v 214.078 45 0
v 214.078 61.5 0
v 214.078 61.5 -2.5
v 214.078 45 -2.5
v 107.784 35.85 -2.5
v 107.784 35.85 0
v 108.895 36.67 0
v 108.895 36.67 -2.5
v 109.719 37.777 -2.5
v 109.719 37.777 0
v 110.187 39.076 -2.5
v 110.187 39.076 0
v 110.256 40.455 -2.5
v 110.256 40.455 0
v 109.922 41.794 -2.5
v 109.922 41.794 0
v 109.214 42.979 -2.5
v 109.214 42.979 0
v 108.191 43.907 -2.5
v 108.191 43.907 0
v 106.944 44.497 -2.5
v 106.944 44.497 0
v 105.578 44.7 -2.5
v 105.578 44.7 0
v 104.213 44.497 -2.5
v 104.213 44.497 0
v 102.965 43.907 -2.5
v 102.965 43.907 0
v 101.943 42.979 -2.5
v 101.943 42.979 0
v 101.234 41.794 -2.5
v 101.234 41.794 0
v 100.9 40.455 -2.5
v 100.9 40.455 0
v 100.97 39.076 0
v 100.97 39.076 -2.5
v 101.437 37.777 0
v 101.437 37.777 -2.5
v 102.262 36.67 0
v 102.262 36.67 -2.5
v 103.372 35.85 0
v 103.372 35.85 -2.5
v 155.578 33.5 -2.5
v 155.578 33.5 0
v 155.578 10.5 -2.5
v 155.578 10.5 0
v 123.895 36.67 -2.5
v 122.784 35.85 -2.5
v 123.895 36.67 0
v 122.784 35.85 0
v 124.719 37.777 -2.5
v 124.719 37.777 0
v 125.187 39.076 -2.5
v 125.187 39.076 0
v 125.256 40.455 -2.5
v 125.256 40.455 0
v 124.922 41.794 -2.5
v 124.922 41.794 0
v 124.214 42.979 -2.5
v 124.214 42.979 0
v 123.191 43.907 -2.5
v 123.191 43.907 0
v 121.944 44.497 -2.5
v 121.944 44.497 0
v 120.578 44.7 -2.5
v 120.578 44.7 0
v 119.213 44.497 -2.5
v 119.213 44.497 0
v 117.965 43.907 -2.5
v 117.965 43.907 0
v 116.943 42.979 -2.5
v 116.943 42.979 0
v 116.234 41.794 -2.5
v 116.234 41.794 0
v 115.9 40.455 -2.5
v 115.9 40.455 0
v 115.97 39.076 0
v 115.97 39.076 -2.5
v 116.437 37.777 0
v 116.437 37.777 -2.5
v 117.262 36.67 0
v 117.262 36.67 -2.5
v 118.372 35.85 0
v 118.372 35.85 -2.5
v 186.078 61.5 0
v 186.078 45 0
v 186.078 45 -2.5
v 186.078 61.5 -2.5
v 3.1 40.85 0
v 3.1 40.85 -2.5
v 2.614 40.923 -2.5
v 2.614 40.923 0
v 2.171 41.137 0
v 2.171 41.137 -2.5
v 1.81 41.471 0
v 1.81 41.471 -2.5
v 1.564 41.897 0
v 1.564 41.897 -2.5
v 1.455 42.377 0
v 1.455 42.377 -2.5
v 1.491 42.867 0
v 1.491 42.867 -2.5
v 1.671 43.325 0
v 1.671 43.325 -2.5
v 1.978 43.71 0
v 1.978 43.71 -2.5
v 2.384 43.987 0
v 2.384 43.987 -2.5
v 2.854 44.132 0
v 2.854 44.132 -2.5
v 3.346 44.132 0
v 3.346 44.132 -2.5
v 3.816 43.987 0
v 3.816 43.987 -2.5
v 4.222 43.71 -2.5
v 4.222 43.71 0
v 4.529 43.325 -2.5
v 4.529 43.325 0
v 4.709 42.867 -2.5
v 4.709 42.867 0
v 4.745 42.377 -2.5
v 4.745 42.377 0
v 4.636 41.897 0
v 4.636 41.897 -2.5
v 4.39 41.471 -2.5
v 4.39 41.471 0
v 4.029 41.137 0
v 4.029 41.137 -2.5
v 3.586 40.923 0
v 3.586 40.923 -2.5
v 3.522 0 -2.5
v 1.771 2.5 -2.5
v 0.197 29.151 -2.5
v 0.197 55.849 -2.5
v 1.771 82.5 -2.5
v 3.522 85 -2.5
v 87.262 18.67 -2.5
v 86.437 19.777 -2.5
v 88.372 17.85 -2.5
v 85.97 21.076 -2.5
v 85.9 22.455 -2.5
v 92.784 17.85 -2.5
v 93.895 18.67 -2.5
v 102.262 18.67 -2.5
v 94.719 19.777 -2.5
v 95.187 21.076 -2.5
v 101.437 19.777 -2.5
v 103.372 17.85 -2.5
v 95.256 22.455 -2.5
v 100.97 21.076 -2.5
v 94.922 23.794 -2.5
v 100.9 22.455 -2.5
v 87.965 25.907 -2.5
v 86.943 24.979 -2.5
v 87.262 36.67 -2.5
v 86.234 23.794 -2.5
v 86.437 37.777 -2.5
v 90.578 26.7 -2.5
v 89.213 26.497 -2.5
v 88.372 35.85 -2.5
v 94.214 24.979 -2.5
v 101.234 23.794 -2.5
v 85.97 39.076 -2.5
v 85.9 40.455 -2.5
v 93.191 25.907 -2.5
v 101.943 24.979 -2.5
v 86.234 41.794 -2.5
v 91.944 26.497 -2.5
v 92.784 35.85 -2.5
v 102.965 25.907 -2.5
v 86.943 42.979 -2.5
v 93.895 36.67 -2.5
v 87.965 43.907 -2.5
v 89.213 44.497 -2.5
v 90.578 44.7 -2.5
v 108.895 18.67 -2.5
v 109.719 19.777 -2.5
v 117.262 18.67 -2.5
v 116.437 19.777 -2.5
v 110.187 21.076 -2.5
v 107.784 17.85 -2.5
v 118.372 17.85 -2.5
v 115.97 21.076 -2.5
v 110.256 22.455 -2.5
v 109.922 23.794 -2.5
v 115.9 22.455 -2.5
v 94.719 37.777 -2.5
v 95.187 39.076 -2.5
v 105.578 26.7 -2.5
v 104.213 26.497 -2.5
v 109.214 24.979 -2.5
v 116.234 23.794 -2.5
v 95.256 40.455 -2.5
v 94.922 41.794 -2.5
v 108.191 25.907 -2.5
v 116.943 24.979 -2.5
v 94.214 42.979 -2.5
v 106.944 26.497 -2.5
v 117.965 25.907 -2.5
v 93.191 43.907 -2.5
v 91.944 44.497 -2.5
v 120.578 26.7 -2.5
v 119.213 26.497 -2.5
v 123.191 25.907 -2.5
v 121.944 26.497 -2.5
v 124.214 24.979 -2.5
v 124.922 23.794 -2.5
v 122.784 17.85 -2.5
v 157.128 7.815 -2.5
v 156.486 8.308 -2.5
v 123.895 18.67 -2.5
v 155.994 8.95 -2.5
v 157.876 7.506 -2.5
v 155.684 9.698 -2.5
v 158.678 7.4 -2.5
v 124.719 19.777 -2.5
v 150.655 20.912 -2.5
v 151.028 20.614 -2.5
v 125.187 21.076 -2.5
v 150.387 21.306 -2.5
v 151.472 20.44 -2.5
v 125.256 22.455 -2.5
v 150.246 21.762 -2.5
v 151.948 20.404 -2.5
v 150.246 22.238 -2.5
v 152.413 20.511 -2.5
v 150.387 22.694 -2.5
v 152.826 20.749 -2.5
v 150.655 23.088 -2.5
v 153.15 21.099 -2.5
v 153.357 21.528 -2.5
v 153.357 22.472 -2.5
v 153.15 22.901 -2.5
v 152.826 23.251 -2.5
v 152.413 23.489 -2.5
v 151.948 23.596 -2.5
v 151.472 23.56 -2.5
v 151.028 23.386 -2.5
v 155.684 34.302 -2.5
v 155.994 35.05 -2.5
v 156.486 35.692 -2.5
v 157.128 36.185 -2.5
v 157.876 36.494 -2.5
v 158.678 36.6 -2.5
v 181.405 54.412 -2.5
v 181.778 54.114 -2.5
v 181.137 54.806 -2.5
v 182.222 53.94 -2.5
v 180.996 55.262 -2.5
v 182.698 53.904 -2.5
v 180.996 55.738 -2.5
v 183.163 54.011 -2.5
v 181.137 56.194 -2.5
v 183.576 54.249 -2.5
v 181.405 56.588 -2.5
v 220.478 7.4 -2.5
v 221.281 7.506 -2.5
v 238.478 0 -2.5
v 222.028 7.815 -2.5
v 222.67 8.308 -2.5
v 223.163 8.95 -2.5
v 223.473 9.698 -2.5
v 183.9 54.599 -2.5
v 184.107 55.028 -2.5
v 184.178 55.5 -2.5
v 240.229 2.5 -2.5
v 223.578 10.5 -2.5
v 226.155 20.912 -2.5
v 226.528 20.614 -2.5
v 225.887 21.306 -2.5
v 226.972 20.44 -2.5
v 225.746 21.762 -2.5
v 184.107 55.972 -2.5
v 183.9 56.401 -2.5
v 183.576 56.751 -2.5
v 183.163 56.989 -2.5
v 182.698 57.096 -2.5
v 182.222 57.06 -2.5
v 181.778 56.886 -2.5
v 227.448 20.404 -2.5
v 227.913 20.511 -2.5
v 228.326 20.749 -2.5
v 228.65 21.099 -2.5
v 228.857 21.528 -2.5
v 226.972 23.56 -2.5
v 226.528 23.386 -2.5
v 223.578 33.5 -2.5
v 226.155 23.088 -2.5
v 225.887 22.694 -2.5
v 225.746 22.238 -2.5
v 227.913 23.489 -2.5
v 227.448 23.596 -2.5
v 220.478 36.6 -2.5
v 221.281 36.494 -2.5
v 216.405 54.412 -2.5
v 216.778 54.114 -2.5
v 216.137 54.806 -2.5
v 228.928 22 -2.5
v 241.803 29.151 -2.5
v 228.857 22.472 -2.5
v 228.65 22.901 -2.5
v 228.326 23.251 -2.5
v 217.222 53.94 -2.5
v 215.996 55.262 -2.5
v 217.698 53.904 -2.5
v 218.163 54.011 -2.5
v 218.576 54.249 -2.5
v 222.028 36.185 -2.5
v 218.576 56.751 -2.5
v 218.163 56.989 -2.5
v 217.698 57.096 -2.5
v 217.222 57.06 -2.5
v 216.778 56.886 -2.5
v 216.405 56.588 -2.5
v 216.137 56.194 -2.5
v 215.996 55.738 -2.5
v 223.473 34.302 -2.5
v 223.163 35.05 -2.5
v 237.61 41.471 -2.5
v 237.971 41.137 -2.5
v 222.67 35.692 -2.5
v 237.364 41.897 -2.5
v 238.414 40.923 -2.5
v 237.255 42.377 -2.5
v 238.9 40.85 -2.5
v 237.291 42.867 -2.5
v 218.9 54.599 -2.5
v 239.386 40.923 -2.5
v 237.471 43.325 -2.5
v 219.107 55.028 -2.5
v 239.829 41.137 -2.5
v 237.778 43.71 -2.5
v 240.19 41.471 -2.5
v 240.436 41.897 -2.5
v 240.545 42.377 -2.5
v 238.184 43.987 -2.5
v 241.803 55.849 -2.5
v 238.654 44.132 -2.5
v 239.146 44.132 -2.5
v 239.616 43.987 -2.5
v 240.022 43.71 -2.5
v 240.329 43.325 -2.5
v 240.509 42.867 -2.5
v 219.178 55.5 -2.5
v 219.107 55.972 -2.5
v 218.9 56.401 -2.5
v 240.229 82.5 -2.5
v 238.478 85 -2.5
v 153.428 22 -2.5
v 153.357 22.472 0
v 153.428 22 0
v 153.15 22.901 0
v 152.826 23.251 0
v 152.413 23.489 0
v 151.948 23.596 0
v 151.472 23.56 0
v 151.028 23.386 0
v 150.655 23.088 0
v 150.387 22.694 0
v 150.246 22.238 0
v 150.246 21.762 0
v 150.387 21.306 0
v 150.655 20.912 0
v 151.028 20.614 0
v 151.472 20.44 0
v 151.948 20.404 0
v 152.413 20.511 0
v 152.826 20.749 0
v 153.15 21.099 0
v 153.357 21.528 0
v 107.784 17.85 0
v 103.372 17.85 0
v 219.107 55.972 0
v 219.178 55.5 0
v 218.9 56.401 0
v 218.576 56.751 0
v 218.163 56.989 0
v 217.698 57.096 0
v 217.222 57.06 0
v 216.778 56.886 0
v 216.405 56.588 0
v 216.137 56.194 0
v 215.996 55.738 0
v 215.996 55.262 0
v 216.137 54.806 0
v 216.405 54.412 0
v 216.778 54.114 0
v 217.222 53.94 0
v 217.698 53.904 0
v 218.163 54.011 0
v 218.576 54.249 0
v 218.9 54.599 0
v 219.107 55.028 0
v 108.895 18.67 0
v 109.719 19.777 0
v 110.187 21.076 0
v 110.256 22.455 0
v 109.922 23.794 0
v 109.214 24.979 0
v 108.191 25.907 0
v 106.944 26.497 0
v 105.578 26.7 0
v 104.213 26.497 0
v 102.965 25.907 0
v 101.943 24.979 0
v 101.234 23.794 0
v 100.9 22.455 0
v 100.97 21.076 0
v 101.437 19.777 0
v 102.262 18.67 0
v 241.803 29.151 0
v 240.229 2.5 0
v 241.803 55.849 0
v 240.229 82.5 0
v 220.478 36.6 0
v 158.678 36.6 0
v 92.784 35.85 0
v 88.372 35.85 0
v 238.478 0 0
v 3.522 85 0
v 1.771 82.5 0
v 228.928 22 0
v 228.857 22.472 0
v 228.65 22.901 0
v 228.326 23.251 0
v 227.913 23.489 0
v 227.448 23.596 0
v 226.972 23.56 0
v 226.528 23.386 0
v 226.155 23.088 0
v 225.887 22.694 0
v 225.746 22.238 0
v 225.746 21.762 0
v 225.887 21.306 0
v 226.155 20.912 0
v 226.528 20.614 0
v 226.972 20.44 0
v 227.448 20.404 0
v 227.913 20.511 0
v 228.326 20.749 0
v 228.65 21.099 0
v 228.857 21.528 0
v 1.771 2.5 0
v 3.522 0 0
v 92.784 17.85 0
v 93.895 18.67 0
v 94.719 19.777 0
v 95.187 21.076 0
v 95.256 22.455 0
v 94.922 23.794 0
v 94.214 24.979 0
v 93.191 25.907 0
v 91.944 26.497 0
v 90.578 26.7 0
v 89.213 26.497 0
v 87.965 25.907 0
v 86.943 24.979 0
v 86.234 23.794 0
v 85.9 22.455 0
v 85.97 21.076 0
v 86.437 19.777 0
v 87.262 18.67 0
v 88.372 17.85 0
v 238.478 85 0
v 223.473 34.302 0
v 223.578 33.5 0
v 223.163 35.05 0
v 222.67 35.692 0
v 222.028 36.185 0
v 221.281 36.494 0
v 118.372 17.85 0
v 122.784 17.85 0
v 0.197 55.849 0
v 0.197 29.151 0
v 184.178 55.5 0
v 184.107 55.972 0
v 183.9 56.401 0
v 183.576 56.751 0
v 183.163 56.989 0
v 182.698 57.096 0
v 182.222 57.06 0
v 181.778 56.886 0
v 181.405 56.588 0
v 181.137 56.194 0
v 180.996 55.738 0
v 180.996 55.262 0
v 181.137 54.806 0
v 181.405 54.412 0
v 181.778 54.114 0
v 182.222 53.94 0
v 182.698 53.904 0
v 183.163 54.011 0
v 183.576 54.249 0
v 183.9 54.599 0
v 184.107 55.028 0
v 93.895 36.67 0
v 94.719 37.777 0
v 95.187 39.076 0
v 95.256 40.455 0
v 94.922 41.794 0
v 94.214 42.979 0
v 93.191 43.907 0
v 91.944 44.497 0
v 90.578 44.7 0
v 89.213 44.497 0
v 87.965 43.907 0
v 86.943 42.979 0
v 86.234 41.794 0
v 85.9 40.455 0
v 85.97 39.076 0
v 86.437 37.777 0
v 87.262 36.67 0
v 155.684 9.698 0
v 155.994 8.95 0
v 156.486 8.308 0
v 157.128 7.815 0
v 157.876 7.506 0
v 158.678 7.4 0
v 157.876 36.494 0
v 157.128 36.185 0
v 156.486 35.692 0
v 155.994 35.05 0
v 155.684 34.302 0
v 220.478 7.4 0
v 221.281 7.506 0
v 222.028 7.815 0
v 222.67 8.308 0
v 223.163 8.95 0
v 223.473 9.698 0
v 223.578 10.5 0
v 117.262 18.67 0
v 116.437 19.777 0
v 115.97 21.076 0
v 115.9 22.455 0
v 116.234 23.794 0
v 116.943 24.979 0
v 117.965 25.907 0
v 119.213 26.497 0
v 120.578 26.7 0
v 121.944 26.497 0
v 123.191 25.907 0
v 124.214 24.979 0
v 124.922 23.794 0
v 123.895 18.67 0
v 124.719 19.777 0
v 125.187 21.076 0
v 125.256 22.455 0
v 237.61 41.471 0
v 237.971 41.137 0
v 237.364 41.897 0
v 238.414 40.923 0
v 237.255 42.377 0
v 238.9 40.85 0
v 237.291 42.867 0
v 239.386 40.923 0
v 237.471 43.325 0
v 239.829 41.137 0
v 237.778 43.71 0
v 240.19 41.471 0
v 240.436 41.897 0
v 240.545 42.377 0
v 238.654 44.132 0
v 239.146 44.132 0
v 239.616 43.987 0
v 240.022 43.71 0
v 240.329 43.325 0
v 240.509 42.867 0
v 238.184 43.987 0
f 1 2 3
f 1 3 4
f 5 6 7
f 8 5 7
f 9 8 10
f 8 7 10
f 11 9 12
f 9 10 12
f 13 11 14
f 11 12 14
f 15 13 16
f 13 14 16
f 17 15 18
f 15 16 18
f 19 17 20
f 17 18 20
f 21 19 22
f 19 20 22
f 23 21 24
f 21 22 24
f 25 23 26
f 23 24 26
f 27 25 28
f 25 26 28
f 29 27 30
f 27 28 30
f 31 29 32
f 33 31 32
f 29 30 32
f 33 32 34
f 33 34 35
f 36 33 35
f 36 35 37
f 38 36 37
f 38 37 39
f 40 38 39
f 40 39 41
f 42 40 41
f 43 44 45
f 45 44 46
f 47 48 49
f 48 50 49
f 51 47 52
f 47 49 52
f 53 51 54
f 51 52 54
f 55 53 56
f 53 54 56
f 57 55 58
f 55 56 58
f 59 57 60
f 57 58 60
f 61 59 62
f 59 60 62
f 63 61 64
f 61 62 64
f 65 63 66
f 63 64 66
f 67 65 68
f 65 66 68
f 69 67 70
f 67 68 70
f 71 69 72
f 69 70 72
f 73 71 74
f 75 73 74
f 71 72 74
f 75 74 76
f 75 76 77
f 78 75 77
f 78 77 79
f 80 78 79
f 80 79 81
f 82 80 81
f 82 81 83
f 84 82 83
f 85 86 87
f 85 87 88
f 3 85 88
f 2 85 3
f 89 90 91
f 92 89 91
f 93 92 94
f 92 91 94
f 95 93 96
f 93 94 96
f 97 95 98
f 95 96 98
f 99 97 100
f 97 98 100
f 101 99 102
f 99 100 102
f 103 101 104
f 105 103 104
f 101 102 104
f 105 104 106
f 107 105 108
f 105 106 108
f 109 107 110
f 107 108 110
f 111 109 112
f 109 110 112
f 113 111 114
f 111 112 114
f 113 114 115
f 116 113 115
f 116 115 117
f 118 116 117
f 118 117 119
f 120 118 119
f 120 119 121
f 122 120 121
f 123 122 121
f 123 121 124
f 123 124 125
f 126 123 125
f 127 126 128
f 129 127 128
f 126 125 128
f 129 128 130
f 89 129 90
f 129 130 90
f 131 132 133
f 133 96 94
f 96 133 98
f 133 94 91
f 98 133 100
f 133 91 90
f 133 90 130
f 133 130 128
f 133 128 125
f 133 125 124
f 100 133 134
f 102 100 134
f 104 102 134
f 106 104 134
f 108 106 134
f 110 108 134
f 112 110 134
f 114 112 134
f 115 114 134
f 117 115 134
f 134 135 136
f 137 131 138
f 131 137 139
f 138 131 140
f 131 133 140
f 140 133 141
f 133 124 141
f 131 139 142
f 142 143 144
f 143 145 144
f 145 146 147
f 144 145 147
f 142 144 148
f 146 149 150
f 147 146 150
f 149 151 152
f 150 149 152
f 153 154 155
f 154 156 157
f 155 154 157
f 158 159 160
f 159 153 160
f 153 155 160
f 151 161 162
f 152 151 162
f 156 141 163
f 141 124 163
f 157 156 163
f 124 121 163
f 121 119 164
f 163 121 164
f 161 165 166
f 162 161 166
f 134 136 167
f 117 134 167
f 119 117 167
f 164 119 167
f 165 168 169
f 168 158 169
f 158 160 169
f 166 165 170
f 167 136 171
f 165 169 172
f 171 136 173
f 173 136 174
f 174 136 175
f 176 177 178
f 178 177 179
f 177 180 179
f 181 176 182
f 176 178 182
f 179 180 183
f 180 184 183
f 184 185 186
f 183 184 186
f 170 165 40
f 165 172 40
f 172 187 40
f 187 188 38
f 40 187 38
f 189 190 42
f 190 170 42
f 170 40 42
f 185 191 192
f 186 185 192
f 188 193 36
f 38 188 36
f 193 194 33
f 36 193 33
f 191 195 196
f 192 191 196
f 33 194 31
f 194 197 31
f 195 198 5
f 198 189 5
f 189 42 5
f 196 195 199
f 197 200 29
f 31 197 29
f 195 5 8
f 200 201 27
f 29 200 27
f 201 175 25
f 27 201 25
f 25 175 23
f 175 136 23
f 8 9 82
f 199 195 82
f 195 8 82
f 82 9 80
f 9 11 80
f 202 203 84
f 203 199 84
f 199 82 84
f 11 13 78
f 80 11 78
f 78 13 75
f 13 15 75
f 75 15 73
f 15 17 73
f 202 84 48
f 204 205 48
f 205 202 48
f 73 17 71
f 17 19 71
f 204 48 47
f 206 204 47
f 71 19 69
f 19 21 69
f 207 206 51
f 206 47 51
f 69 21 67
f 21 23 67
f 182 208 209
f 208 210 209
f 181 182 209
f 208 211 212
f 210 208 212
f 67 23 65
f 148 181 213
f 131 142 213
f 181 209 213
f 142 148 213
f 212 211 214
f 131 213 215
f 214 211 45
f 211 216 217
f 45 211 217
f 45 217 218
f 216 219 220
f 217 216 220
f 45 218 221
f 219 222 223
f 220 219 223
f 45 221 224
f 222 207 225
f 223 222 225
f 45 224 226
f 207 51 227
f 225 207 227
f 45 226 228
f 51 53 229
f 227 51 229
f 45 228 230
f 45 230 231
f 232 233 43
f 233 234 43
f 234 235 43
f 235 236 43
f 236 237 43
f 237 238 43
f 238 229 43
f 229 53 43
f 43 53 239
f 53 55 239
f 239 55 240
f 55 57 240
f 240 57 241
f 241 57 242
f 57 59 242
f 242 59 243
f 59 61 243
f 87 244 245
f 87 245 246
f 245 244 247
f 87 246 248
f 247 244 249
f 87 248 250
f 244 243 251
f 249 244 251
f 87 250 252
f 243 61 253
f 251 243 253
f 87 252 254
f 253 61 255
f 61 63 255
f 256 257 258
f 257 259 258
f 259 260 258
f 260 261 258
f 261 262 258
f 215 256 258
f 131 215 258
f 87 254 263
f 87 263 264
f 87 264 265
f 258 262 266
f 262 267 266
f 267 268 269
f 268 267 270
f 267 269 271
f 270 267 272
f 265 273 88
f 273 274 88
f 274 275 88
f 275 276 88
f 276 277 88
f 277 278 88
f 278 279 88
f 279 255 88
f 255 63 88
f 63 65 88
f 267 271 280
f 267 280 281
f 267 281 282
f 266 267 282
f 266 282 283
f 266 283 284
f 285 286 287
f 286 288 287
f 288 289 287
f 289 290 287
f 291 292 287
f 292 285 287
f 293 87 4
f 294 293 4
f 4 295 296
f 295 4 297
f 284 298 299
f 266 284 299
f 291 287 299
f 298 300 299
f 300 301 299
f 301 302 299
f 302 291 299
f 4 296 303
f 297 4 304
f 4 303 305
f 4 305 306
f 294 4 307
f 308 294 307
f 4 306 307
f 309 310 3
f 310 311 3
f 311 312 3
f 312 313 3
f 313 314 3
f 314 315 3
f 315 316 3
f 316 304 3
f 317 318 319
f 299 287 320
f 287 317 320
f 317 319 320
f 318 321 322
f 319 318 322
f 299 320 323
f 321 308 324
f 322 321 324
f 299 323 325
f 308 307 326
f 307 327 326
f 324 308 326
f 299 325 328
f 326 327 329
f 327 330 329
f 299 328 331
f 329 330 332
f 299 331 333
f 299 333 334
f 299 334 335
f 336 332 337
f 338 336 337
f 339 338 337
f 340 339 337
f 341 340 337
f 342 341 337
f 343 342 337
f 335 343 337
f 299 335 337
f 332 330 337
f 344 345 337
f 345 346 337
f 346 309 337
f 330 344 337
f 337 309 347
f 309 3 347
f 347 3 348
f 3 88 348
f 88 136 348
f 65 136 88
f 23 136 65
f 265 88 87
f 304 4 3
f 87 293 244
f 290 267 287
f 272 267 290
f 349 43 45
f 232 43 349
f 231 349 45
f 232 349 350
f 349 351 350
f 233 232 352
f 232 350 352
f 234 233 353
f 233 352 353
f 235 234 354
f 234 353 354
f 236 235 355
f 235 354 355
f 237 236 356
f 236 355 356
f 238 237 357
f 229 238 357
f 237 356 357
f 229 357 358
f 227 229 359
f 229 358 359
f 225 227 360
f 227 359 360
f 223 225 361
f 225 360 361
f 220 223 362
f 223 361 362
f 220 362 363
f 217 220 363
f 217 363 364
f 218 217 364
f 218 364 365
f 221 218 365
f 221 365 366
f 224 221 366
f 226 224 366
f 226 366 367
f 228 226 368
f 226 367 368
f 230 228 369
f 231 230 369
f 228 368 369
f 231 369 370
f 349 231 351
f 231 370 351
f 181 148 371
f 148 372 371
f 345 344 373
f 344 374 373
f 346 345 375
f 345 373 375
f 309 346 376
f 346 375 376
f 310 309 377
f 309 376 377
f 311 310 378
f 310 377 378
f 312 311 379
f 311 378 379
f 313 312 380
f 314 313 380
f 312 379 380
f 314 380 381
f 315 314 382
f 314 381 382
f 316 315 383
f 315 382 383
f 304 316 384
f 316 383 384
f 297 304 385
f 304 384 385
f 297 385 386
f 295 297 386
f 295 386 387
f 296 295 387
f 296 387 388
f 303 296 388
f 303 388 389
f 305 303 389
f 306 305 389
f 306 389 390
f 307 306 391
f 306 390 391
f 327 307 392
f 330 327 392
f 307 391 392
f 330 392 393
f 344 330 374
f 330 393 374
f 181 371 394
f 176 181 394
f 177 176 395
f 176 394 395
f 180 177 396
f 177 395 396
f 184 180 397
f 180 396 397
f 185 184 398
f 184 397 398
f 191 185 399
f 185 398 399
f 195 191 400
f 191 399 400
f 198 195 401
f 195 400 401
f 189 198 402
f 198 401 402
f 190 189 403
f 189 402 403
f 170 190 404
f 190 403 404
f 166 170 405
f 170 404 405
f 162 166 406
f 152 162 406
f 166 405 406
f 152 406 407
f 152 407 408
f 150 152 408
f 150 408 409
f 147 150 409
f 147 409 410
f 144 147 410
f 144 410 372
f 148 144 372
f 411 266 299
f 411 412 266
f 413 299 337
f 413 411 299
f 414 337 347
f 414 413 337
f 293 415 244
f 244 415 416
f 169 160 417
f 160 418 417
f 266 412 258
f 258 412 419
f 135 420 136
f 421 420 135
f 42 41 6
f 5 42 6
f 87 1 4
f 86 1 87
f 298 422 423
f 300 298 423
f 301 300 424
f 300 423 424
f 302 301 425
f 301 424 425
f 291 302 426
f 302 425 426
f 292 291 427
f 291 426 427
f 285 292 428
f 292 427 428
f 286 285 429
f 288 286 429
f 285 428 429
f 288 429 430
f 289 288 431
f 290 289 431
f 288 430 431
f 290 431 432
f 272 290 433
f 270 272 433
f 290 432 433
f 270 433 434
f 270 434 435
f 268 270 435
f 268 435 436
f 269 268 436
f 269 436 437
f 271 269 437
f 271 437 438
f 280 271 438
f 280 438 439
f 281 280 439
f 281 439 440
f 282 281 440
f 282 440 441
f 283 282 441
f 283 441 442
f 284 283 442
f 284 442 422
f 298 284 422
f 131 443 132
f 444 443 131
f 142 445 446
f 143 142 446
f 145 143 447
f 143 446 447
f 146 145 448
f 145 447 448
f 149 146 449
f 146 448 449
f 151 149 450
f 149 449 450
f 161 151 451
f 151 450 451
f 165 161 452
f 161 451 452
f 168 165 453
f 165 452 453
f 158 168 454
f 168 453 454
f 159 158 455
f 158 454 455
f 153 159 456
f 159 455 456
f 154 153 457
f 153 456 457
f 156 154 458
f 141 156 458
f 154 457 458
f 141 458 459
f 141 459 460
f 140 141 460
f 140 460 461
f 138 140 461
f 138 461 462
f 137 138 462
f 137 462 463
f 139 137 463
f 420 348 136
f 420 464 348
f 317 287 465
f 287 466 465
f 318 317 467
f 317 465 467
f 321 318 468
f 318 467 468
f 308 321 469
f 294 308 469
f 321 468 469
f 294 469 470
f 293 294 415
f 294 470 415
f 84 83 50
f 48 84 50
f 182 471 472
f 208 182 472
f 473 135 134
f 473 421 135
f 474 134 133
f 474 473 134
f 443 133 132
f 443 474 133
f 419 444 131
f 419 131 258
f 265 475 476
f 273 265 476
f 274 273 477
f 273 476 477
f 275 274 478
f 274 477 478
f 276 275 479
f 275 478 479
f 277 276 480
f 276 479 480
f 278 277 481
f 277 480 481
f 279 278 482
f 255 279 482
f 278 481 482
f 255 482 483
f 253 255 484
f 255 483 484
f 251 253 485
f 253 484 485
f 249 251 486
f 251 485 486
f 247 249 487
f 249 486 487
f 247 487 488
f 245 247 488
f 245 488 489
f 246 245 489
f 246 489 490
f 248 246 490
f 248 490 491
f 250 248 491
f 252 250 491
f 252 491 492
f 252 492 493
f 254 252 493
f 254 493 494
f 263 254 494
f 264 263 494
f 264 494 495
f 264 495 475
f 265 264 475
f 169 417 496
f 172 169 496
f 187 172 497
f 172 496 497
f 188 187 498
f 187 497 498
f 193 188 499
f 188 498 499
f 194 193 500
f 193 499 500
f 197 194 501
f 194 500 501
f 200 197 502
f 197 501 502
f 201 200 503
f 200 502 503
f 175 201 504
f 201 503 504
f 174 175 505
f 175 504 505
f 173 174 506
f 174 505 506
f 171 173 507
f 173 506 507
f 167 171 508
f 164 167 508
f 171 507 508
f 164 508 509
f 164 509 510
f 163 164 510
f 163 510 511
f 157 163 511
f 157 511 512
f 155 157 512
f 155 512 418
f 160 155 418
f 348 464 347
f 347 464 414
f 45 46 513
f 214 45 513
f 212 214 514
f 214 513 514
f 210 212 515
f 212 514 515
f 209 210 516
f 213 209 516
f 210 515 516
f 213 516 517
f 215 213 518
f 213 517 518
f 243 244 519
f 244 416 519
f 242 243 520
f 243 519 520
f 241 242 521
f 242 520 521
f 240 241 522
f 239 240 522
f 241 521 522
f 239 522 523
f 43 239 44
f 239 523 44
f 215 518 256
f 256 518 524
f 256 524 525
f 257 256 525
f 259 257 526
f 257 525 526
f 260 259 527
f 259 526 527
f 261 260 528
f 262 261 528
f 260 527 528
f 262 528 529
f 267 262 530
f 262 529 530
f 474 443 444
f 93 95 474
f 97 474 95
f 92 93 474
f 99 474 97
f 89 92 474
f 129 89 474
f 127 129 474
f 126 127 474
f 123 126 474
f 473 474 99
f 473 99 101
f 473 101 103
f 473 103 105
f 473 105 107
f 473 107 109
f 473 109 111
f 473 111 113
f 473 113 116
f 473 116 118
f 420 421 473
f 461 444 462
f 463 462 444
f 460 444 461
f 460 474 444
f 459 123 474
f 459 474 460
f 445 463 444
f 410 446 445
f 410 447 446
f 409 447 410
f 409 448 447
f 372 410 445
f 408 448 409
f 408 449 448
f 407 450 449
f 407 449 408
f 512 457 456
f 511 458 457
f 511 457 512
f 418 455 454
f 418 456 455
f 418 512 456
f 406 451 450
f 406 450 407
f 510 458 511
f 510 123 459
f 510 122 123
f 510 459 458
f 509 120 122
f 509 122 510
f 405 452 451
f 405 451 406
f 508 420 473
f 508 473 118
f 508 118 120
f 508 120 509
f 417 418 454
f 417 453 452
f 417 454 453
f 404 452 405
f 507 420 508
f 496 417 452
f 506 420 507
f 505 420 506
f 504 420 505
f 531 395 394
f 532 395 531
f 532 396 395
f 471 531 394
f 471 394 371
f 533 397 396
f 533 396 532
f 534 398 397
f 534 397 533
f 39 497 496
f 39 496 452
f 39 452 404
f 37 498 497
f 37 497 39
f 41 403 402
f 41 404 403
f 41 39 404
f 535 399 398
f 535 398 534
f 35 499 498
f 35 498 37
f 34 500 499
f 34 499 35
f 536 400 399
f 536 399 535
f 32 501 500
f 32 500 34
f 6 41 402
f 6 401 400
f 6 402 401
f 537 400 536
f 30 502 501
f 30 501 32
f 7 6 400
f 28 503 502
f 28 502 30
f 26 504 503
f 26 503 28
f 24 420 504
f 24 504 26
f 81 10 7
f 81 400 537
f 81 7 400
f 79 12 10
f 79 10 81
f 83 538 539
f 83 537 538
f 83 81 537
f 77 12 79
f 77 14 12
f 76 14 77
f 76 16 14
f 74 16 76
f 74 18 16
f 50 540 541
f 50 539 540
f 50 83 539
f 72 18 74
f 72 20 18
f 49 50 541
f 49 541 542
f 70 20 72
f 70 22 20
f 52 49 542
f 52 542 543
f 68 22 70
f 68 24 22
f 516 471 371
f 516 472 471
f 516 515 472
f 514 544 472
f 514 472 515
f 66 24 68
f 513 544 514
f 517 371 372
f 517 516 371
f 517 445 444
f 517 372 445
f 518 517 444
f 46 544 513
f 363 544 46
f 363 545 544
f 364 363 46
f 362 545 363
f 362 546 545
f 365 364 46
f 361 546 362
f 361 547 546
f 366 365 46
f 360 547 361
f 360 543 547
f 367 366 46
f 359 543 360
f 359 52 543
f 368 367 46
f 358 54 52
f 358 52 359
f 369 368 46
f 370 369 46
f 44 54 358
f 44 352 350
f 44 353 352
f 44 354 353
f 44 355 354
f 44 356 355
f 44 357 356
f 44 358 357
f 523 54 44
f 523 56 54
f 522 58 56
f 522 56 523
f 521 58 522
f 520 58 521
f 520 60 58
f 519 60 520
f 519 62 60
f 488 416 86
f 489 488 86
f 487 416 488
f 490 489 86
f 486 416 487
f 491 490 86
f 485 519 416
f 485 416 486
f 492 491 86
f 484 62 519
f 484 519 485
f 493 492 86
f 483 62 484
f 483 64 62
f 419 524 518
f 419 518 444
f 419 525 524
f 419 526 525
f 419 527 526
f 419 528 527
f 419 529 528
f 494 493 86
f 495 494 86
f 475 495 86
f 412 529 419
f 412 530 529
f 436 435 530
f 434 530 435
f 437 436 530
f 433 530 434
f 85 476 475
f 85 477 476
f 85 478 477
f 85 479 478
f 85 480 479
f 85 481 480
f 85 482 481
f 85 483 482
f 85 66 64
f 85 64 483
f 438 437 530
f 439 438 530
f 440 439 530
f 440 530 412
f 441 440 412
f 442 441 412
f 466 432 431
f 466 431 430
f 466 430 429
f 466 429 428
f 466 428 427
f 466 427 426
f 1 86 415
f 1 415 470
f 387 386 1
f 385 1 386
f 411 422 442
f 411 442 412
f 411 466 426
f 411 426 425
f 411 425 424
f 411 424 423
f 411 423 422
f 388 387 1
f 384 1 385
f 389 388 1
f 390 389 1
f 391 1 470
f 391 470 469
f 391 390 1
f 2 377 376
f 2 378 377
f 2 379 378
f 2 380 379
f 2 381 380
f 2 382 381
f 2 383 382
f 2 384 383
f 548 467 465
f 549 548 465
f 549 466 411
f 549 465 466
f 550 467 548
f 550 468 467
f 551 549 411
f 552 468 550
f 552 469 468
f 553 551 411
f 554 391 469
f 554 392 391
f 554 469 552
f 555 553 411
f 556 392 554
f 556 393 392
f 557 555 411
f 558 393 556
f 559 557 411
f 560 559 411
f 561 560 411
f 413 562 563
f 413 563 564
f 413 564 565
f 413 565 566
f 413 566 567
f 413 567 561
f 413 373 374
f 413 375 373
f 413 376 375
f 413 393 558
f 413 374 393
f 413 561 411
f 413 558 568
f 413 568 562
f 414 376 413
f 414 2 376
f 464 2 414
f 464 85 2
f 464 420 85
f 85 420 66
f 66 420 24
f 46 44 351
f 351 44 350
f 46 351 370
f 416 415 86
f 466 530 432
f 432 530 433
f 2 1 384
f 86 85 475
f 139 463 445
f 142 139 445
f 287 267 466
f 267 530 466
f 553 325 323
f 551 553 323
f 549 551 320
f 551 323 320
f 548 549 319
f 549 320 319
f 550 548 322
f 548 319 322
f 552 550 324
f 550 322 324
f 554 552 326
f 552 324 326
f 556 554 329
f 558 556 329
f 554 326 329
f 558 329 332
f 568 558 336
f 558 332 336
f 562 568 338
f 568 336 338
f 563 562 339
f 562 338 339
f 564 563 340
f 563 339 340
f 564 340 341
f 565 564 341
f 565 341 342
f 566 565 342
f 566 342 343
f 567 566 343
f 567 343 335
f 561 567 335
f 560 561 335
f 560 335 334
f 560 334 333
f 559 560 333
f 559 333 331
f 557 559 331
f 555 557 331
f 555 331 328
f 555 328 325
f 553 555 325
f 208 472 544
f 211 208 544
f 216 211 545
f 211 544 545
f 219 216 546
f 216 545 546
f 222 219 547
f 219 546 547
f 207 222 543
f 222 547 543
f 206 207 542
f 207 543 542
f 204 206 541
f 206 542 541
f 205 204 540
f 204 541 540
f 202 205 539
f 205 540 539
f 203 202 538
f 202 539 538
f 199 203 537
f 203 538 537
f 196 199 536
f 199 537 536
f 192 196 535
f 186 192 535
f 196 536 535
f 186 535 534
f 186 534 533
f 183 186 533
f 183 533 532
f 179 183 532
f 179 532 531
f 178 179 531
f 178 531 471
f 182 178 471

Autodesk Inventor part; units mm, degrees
ref_plane "YZ Plane" through (0, 0, 0) normal (1, 0, 0) x (0, 1, 0)
ref_plane "XZ Plane" through (0, 0, 0) normal (0, 1, 0) x (-1, 0, 0)
ref_plane "XY Plane" through (0, 0, 0) normal (0, 0, 1) x (1, 0, 0)
sketch "Skizze1" plane through (0, 0, 0) normal (0, 0, 1) x (1, 0, 0)
  line L0 (0, 0) -> (242, 0)
  line L1 (242, 0) -> (242, 85)
  line L2 (242, 85) -> (0, 85)
  line L3 (0, 85) -> (0, 0)
  line L4 (242, 42.5) -> (842, 42.5)
  line L5 (0, 42.5) -> (-937, 42.5)
  arc A0 (240, 0) -> (240, 85) centre (-210.5625, 42.5) ccw
  arc A1 (2, 85) -> (2, 0) centre (452.5625, 42.5) ccw
  dimension "d0" = 85
  dimension "d1" = 242
  dimension "d2" = 2
  dimension "d3" = 2
  dimension "d4" = 2
  dimension "d7" = 452.5625
  dimension "d8" = 452.5625
extrude "Extrusion1" add sketch "Skizze1" against normal blind 2.5 contours A1 L2 A0 L0
sketch "Skizze2" plane through (0, 0, 0) normal (0, 0, 1) x (1, 0, 0)
  line L0 (2, 0) -> (240, 0) projected
  line L1 (240, 85) -> (2, 85) projected
  line L2 (121, 0) -> (121, 85)
  point P0 (0, 0)
  point P1 (3.1, 42.5)
  point P2 (238.9, 42.5)
  dimension "d11" = 42.5
  dimension "d12" = 42.5
  dimension "d13" = 235.8
  dimension "d14" = 117.9
  dimension "d15" = 117.9
hole "Bohrung1" at (3.1, 42.5, 0) at (238.9, 42.5, 0) direction (0, 0, -1) diameter 3.3 depth 8 tip angle 118
sketch "Skizze3" plane through (0, 0, 0) normal (0, 0, 1) x (1, 0, 0)
  line L0 (2, 0) -> (240, 0) projected
  line L1 (240, 85) -> (2, 85) projected
  arc A0 (2, 85) -> (2, 0) centre (452.5625, 42.5) ccw projected
  line L2 (8.1386, 91.5936) -> (-1.2688, 78.1585)
  line L3 (-1.2688, 78.1585) -> (-1.2688, 91.5936)
  line L4 (-1.2688, 91.5936) -> (8.1386, 91.5936)
  line L5 (-1.7926, 7.5896) -> (9.0296, -7.8661)
  line L6 (9.0296, -7.8661) -> (-1.7926, -7.8661)
  line L7 (-1.7926, -7.8661) -> (-1.7926, 7.5896)
  line L8 (121, 0) -> (121, 85)
  line L9 (233.8614, 91.5936) -> (243.2688, 78.1585)
  line L10 (243.2688, 78.1585) -> (243.2688, 91.5936)
  line L11 (243.2688, 91.5936) -> (233.8614, 91.5936)
  line L12 (243.7926, 7.5896) -> (232.9704, -7.8661)
  line L13 (232.9704, -7.8661) -> (243.7926, -7.8661)
  line L14 (243.7926, -7.8661) -> (243.7926, 7.5896)
  point P0 (0, 0)
  point P1 (1.7712, 82.5)
  point P2 (1.7712, 2.5)
  point P3 (242, 0)
  point P4 (240.2288, 82.5)
  point P5 (240.2288, 2.5)
  dimension "d23" = 55
  dimension "d24" = 55
  dimension "d25" = 2.5
  dimension "d26" = 2.5
extrude "Extrusion2" cut sketch "Skizze3" against normal blind 5 contours A0 L5 L0 | L0 L5 L6 L7 A0 | L9 L11 L10 | L12 L14 L13 | L2 L3 L4 L1 A0 | A0 L1 L2
sketch "Sketch7" plane through (0, 0, 0) normal (0, 0, 1) x (1, 0, 0)
  point P0 (0, 0)
sketch "Sketch8" plane through (0, 0, 0) normal (0, 0, 1) x (1, 0, 0)
  circle A0 centre (151.8283, 22) radius 1.6
  line L0 (151.8283, 22) -> (227.3283, 22)
  circle A1 centre (227.3283, 22) radius 1.6
  line L1 (220.4783, 36.6) -> (158.6783, 36.6)
  line L2 (155.5783, 33.5) -> (155.5783, 10.5)
  line L3 (158.6783, 7.4) -> (220.4783, 7.4)
  line L4 (223.5783, 10.5) -> (223.5783, 33.5)
  line L5 (223.5783, 36.6) -> (155.5783, 7.4) construction
  line L6 (155.5783, 36.6) -> (223.5783, 7.4) construction
  arc A2 (158.6783, 36.6) -> (155.5783, 33.5) centre (158.6783, 33.5) ccw
  arc A3 (155.5783, 10.5) -> (158.6783, 7.4) centre (158.6783, 10.5) ccw
  arc A4 (220.4783, 7.4) -> (223.5783, 10.5) centre (220.4783, 10.5) ccw
  arc A5 (223.5783, 33.5) -> (220.4783, 36.6) centre (220.4783, 33.5) ccw
  line L7 (3.5217, 0) -> (238.4783, 0) projected
  line L8 (222.5783, 45) -> (177.5783, 45)
  line L9 (177.5783, 45) -> (177.5783, 61.5)
  line L10 (177.5783, 61.5) -> (222.5783, 61.5)
  line L11 (222.5783, 61.5) -> (222.5783, 45)
  line L12 (222.5783, 45) -> (177.5783, 61.5) construction
  line L13 (177.5783, 45) -> (222.5783, 61.5) construction
  line L14 (214.0783, 45) -> (186.0783, 45)
  line L15 (186.0783, 45) -> (186.0783, 61.5)
  line L16 (186.0783, 61.5) -> (214.0783, 61.5)
  line L17 (214.0783, 61.5) -> (214.0783, 45)
  line L18 (214.0783, 45) -> (186.0783, 61.5) construction
  line L19 (186.0783, 45) -> (214.0783, 61.5) construction
  circle A6 centre (217.5783, 55.5) radius 1.6
  circle A7 centre (182.5783, 55.5) radius 1.6
  arc A8 (122.7845, 17.85) -> (118.3721, 17.85) centre (120.5783, 22) ccw
  line L20 (118.3721, 17.85) -> (122.7845, 17.85)
  arc A9 (92.7845, 17.85) -> (88.3721, 17.85) centre (90.5783, 22) ccw
  line L21 (88.3721, 17.85) -> (92.7845, 17.85)
  arc A10 (107.7845, 17.85) -> (103.3721, 17.85) centre (105.5783, 22) ccw
  line L22 (103.3721, 17.85) -> (107.7845, 17.85)
  arc A11 (122.7845, 35.85) -> (118.3721, 35.85) centre (120.5783, 40) ccw
  line L23 (118.3721, 35.85) -> (122.7845, 35.85)
  line L24 (88.3721, 35.85) -> (92.7845, 35.85)
  arc A12 (92.7845, 35.85) -> (88.3721, 35.85) centre (90.5783, 40) ccw
  line L25 (103.3721, 35.85) -> (107.7845, 35.85)
  arc A13 (107.7845, 35.85) -> (103.3721, 35.85) centre (105.5783, 40) ccw
  point P0 (0, 0)
  point P1 (189.5783, 22)
  point P2 (200.0783, 53.25)
  dimension "d75" = 3.2
  dimension "d76" = 75.5
  dimension "d77" = 3.2
  dimension "d78" = 68
  dimension "d79" = 29.2
  dimension "d80" = 3.1
  dimension "d81" = 22
  dimension "d82" = 11.15
  dimension "d87" = 45
  dimension "d89" = 28
  dimension "d90" = 16.5
  dimension "d91" = 3.2
  dimension "d92" = 5
  dimension "d93" = 3.2
  dimension "d94" = 5
  dimension "d95" = 10.5
  dimension "d96" = 10.5
  dimension "d97" = 45
  dimension "d98" = 1
  dimension "d99" = 9.4
  dimension "d101" = 9.4
  dimension "d103" = 9.4
  dimension "d113" = 35
  dimension "d114" = 15
  dimension "d115" = 15
  dimension "d116" = 9.4
  dimension "d118" = 9.4
  dimension "d120" = 9.4
  dimension "d122" = 15
  dimension "d123" = 15
  dimension "d125" = 22
  dimension "d126" = 40
  dimension "d128" = 8.85
  dimension "d129" = 4.15
extrude "Extrusion5" cut sketch "Sketch8" against normal blind 3 contours A0 | A1 | L2 A2 L1 A5 L4 L0 | L0 L4 A4 L3 A3 L2 | L8 L15 L10 L17 | A6 | A7 | L20 A8 | L21 A9 | L22 A10 | L23 A11 | A12 L24 | A13 L25
properties part number "Frontplatte Apra Xdream 418"
